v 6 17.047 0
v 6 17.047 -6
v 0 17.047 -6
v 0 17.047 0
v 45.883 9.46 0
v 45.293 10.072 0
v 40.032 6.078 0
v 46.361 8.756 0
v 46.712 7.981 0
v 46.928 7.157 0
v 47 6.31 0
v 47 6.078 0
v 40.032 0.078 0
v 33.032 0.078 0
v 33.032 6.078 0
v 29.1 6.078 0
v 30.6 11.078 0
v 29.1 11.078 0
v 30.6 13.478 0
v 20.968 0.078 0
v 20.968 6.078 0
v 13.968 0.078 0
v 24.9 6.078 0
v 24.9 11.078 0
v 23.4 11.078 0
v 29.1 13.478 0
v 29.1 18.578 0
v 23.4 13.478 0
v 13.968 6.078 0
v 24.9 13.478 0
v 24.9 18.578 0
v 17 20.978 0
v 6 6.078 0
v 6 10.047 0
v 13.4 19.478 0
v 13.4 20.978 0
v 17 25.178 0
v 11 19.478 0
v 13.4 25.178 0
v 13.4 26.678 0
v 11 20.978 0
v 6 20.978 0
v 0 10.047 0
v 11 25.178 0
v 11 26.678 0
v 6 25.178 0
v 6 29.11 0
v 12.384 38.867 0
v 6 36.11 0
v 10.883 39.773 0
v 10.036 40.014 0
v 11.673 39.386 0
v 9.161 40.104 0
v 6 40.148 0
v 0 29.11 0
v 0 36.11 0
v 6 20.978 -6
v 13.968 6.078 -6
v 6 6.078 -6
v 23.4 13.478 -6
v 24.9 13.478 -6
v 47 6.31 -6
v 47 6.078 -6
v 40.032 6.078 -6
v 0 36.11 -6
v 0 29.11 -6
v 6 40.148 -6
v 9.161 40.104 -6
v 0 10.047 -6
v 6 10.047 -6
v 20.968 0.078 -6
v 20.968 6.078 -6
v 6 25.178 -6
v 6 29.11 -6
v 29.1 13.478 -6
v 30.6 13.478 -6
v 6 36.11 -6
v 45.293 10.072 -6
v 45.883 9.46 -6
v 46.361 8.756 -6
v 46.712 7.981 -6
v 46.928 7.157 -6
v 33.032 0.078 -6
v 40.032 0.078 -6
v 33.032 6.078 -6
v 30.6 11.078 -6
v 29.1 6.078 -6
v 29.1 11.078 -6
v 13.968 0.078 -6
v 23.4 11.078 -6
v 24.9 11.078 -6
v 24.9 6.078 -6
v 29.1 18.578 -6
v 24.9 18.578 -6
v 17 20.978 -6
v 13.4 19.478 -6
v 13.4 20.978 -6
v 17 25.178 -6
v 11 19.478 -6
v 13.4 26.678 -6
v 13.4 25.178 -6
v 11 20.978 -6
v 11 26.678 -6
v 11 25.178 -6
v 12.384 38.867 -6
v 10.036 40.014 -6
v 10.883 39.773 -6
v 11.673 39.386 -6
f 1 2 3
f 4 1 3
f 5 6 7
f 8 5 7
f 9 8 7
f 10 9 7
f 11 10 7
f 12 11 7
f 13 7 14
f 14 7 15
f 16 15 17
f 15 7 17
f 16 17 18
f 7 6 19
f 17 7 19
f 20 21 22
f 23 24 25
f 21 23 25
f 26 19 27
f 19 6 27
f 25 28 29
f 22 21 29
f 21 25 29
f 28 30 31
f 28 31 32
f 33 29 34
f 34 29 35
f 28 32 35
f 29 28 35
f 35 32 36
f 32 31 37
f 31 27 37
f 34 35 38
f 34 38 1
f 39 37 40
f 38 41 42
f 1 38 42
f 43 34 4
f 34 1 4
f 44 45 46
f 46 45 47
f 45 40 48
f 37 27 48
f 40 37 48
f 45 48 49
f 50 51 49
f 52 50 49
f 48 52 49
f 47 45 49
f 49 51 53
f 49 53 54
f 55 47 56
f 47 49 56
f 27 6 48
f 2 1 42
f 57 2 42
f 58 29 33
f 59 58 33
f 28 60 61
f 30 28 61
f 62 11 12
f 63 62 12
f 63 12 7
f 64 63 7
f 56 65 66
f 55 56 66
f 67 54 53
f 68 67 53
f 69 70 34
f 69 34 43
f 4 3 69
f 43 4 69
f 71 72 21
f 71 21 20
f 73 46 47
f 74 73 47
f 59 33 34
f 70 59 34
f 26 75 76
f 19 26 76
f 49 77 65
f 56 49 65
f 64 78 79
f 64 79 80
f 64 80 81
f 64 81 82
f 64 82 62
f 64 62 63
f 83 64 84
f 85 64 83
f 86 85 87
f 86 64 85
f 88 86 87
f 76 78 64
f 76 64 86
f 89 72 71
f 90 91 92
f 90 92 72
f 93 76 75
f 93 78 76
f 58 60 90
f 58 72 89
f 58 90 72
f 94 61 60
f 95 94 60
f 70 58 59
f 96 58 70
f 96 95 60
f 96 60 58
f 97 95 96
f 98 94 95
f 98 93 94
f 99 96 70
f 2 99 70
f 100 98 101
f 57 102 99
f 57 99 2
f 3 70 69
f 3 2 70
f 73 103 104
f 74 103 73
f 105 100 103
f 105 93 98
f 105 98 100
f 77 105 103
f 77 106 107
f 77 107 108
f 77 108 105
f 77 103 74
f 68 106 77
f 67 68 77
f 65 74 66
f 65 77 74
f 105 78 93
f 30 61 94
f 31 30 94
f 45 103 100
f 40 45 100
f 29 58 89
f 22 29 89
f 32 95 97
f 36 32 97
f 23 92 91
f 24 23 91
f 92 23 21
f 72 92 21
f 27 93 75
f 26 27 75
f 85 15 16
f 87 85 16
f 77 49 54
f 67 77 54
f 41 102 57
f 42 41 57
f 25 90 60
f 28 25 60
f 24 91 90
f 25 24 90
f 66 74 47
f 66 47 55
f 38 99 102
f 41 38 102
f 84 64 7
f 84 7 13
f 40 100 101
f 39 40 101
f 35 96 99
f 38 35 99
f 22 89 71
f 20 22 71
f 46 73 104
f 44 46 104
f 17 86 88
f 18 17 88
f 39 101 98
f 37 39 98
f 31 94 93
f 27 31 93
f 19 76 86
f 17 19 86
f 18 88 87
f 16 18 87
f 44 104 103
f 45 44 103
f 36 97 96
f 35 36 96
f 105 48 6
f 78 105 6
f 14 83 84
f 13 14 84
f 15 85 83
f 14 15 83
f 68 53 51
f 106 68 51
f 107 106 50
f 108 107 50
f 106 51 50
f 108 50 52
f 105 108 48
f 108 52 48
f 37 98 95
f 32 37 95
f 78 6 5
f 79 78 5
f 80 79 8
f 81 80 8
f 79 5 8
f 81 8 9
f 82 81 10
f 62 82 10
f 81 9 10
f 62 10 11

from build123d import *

# Parameters (mm, degrees)
EXTRUDE_1_DEPTH      = 6
SKETCH_23_W          = 7
SKETCH_23_H          = 6
EXTRUDE_23_DEPTH     = 6
CUT_EXTRUDE_11_DEPTH = 7
SKETCH_2_W           = 7
SKETCH_2_H           = 6
EXTRUDE_2_DEPTH      = 6
CUT_EXTRUDE_1_DEPTH  = 7
SKETCH_24_W          = 7
SKETCH_24_H          = 6
EXTRUDE_24_DEPTH     = 6
SKETCH_25_W          = 7
SKETCH_25_H          = 6
EXTRUDE_26_DEPTH     = 6


with BuildPart() as part:
    # Эскиз1 → Бобышка-Вытянуть1 (new body)
    with BuildSketch(Plane.XY):
        with BuildLine():
            Line((47, 6.078379342), (6, 6.078379342))
            Line((6, 6.078379342), (6, 40.147643713))
            Line((6, 40.147643713), (9.160917848, 40.103855916))
            ThreePointArc((9.160917848, 40.103855916), (10.882668259, 39.772556875), (12.384183162, 38.867219076))
            Line((12.384183162, 38.867219076), (45.292523039, 10.072421683))
            ThreePointArc((45.292523039, 10.072421683), (46.55316457, 8.375619622), (47, 6.309538209))
            Line((47, 6.309538209), (47, 6.078379342))
        make_face()
    extrude(amount=-EXTRUDE_1_DEPTH)

    # Эскиз23 → Бобышка-Вытянуть23 (add)
    with BuildSketch(Plane(origin=(27, 56.078379342, -6), x_dir=(1, 0, 0), z_dir=(0, 0, -1))):
        with Locations((-9.531849908, 53)):
            Rectangle(SKETCH_23_W, SKETCH_23_H)
        with Locations((9.531849908, 53)):
            Rectangle(SKETCH_23_W, SKETCH_23_H)
    extrude(amount=-EXTRUDE_23_DEPTH)

    # Эскиз31 → Вырез-Вытянуть11 (cut, through all)
    with BuildSketch(Plane(origin=(27, 56.078379342, -6), x_dir=(1, 0, 0), z_dir=(0, 0, -1))):
        Polygon((-2.1, 45), (-3.6, 45), (-3.6, 42.6), (-2.1, 42.6), (-2.1, 37.5), (2.1, 37.5), (2.1, 42.6), (3.6, 42.6), (3.6, 45), (2.1, 45), (2.1, 50), (-2.1, 50), align=None)
    extrude(amount=-CUT_EXTRUDE_11_DEPTH, mode=Mode.SUBTRACT)

    # Эскиз2 → Бобышка-Вытянуть2 (add)
    with BuildSketch(Plane(origin=(56, 23.078379342, -6), x_dir=(0, -1, 0), z_dir=(0, 0, -1))):
        with Locations((-9.531849908, 53)):
            Rectangle(SKETCH_2_W, SKETCH_2_H)
        with Locations((9.531849908, 53)):
            Rectangle(SKETCH_2_W, SKETCH_2_H)
    extrude(amount=-EXTRUDE_2_DEPTH)

    # Эскиз3 → Вырез-Вытянуть1 (cut, through all)
    with BuildSketch(Plane(origin=(56, 23.078379342, -6), x_dir=(0, -1, 0), z_dir=(0, 0, -1))):
        Polygon((-2.1, 45), (-3.6, 45), (-3.6, 42.6), (-2.1, 42.6), (-2.1, 39), (2.1, 39), (2.1, 42.6), (3.6, 42.6), (3.6, 45), (2.1, 45), (2.1, 50), (-2.1, 50), align=None)
    extrude(amount=-CUT_EXTRUDE_1_DEPTH, mode=Mode.SUBTRACT)

    # Эскиз24 → Бобышка-Вытянуть24 (add)
    with BuildSketch(Plane(origin=(56, 23.078379342, 0), x_dir=(0, 1, 0), z_dir=(0, 0, 1))):
        with Locations((-9.531849908, 53)):
            Rectangle(SKETCH_24_W, SKETCH_24_H)
        with Locations((9.531849908, 53)):
            Rectangle(SKETCH_24_W, SKETCH_24_H)
    extrude(amount=-EXTRUDE_24_DEPTH)

    # Эскиз25 → Бобышка-Вытянуть26 (add)
    with BuildSketch(Plane(origin=(27, 56.078379342, -6), x_dir=(1, 0, 0), z_dir=(0, 0, -1))):
        with Locations((-9.531849908, 53)):
            Rectangle(SKETCH_25_W, SKETCH_25_H)
        with Locations((9.531849908, 53)):
            Rectangle(SKETCH_25_W, SKETCH_25_H)
    extrude(amount=-EXTRUDE_26_DEPTH)


solid = part.part
